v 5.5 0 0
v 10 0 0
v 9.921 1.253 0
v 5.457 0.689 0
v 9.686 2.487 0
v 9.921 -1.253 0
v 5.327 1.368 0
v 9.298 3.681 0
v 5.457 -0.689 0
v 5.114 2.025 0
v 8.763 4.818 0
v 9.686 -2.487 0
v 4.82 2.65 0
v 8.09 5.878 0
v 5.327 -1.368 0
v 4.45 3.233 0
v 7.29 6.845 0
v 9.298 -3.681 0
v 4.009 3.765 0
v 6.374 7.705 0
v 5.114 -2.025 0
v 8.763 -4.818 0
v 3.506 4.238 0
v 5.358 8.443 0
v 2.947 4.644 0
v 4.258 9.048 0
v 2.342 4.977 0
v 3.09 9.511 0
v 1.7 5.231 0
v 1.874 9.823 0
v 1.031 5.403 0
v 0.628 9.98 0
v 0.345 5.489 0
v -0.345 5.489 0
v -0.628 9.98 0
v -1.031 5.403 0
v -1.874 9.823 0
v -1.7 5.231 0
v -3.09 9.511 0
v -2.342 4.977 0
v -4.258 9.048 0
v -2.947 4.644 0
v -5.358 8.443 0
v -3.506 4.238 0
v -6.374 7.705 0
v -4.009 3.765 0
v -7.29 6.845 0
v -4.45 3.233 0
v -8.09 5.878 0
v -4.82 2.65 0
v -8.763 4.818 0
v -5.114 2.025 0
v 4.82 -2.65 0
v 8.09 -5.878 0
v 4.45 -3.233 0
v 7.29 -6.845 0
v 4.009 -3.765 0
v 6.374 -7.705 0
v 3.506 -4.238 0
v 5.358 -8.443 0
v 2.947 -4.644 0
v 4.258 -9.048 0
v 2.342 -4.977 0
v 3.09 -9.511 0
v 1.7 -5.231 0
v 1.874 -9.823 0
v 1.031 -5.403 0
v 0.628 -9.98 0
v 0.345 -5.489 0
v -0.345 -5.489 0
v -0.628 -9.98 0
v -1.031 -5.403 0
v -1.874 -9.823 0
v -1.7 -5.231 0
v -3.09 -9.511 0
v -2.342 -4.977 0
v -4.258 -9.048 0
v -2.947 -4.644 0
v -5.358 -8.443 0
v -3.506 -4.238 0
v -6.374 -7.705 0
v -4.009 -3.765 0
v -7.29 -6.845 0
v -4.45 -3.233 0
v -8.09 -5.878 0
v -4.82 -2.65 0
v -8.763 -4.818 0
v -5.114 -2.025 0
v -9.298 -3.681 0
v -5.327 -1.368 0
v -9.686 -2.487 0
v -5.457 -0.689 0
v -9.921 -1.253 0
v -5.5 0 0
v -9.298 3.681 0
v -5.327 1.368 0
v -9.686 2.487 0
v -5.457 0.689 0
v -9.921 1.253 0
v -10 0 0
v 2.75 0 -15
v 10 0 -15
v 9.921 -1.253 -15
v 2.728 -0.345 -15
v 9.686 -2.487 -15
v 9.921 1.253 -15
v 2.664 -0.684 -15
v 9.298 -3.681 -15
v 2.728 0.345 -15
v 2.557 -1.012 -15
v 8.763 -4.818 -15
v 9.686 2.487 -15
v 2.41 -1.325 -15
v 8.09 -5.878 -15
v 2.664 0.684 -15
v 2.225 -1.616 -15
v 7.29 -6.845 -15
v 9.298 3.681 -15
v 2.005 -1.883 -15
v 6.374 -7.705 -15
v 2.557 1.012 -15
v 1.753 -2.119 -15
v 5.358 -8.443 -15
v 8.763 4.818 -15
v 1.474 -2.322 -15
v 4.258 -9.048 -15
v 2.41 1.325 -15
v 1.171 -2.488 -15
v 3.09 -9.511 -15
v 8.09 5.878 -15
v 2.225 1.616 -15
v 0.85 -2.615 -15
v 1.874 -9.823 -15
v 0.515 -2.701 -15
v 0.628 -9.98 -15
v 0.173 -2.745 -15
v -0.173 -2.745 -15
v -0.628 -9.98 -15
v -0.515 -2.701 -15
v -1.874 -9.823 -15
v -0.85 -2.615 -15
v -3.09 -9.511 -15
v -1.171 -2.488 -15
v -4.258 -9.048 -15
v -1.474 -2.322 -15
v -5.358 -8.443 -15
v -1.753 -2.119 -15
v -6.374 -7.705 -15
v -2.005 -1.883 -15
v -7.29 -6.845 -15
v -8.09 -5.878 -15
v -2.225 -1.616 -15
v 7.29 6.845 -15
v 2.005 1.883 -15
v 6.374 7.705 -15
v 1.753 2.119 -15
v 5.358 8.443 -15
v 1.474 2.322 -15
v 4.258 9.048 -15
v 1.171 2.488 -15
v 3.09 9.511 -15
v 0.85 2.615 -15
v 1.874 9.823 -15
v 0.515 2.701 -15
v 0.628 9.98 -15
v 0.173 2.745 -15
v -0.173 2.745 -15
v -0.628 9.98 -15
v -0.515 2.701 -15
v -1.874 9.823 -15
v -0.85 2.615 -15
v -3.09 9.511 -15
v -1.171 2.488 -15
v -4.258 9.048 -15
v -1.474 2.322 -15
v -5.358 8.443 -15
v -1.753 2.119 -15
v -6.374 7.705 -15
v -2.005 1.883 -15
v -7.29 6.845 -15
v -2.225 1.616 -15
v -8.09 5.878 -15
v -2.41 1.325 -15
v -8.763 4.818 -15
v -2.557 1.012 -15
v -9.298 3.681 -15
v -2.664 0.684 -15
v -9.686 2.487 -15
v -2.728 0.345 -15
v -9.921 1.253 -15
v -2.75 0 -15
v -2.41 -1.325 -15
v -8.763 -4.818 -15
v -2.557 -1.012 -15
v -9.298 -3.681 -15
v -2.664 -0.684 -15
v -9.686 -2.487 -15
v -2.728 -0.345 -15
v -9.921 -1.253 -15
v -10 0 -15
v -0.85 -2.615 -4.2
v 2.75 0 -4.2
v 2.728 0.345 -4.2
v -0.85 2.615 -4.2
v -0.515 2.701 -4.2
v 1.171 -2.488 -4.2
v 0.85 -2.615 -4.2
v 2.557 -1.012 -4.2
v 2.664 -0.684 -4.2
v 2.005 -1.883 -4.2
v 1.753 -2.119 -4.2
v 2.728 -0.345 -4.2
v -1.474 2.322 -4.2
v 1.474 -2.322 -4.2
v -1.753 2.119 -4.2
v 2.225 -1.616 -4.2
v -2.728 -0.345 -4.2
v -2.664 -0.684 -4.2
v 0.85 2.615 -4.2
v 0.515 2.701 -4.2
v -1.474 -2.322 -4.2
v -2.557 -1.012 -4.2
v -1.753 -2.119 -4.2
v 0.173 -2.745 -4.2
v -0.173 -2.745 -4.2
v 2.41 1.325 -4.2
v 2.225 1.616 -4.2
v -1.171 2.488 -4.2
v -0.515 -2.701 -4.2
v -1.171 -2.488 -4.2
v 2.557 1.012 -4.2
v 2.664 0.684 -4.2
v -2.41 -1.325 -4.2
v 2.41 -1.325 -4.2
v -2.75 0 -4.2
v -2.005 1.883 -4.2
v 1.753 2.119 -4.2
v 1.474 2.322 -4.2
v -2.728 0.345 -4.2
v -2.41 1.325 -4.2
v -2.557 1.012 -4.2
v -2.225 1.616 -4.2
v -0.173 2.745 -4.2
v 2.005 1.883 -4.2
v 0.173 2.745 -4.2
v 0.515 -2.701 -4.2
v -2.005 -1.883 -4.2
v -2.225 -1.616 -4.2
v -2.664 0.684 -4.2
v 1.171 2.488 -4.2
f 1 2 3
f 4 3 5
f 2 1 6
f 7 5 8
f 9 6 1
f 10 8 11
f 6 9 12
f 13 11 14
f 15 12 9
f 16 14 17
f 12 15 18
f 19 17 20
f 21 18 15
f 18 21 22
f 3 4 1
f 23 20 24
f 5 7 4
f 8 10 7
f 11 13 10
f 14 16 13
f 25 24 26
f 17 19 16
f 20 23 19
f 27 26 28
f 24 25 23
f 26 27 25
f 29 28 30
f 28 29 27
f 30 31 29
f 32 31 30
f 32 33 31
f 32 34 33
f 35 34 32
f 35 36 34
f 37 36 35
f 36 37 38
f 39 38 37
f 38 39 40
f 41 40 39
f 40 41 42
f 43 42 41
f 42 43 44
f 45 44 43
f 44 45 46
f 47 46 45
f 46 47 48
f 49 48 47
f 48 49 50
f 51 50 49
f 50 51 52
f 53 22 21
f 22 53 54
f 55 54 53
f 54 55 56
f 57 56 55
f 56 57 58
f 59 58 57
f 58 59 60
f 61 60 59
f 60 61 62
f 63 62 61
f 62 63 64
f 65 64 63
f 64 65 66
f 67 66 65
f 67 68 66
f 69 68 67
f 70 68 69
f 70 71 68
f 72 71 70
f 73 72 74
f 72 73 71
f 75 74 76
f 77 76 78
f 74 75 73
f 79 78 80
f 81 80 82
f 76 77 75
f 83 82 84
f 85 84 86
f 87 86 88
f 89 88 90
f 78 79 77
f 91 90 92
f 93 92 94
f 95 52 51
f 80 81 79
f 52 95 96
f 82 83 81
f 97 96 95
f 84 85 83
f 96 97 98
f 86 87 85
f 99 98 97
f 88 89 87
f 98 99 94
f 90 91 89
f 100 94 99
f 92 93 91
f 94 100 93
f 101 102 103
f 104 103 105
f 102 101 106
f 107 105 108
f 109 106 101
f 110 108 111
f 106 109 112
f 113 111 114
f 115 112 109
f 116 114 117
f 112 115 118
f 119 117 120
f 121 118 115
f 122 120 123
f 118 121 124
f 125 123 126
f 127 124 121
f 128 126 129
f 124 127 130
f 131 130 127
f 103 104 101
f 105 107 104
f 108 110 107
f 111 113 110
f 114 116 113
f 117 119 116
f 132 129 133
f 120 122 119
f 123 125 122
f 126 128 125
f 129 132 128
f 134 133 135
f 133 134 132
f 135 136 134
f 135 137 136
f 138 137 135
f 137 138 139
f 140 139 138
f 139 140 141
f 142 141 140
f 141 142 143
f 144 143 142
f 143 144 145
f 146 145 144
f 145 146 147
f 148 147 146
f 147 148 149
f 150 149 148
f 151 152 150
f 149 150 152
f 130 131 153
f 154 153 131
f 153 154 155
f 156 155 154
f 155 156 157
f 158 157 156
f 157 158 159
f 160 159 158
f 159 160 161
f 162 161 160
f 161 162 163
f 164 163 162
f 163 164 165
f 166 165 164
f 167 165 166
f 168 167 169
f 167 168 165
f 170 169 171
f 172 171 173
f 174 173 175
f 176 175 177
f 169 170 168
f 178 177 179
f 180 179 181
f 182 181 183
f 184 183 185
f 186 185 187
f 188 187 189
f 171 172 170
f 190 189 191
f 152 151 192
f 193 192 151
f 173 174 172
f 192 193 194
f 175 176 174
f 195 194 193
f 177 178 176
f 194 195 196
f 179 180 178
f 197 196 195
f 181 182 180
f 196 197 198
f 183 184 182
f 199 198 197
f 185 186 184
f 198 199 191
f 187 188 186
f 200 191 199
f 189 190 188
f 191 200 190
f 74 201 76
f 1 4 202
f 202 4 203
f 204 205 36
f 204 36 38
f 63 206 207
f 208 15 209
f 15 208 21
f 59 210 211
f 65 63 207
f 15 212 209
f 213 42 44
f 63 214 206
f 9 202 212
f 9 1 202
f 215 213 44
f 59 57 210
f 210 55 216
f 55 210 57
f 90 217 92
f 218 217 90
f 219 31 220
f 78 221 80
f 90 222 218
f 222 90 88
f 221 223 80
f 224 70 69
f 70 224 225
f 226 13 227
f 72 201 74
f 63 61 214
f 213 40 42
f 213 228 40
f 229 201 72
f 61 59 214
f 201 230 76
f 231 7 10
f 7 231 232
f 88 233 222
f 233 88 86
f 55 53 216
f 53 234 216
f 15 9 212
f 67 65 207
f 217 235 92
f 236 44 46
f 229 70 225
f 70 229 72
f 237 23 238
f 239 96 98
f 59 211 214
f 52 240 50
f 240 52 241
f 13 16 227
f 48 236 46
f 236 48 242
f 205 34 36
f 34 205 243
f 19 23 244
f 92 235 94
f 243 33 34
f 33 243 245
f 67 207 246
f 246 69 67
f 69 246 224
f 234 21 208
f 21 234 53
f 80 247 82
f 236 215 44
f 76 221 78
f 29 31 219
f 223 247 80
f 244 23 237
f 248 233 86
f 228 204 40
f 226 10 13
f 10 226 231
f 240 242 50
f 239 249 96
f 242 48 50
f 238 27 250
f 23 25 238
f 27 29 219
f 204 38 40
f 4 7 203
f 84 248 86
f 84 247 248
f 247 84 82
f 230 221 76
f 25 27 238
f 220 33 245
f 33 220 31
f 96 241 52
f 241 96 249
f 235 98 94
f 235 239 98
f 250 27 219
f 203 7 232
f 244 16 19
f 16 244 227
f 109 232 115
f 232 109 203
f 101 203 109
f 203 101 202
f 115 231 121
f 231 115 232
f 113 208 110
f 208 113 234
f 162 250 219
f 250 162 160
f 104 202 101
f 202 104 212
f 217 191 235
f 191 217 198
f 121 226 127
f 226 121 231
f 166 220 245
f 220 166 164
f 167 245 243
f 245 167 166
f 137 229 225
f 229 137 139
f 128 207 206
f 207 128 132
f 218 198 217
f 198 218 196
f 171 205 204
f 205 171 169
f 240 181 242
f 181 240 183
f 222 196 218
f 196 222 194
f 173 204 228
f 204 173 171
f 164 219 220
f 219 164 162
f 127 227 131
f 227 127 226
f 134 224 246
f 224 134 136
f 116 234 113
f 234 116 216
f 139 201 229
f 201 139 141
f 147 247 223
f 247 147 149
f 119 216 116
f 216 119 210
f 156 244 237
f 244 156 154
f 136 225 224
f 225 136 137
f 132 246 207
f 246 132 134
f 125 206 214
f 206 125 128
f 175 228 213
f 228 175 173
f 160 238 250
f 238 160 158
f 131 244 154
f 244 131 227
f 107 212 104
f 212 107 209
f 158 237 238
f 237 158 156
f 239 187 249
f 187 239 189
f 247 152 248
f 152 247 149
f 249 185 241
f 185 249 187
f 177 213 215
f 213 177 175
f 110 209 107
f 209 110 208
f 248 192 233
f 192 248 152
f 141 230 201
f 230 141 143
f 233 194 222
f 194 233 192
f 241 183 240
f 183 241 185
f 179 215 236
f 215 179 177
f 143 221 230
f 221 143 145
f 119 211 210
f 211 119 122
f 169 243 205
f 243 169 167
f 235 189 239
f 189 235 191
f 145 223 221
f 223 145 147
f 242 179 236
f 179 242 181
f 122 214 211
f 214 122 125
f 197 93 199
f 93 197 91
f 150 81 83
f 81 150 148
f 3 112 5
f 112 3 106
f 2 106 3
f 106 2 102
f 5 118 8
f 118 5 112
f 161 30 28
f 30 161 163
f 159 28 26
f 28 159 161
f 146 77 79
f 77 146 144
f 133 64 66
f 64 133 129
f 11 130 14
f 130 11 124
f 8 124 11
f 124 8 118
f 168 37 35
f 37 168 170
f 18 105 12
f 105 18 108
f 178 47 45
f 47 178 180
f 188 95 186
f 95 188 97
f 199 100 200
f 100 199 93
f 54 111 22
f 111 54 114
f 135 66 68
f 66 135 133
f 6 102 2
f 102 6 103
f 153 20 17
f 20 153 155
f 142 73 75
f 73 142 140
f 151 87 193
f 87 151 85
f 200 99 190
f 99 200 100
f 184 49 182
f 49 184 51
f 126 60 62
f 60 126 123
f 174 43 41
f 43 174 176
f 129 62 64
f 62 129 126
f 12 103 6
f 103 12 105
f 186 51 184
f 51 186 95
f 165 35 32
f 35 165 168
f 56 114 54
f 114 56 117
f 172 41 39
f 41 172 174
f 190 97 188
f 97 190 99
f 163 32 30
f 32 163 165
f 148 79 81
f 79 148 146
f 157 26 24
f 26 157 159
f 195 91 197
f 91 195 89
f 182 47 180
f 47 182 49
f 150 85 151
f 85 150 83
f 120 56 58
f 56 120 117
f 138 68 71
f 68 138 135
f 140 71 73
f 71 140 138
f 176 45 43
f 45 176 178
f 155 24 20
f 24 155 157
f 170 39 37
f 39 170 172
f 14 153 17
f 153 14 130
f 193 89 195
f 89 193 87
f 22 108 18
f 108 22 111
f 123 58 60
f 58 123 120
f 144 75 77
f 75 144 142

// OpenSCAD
$fn = 50;


difference() {
	union() {
		translate(v = [0, 0, -15.0000000000]) {
			cylinder(h = 15, r = 10.0000000000);
		}
		cylinder(h = 0, r = 20.0000000000);
	}
	union() {
		translate(v = [0, 0, 0]) {
			rotate(a = [0, 0, 0]) {
				difference() {
					union() {
						#translate(v = [0, 0, -15.0000000000]) {
							cylinder(h = 15, r = 2.2500000000);
						}
						#translate(v = [0, 0, -4.2000000000]) {
							cylinder(h = 4.2000000000, r = 10.0000000000, r1 = 2.7500000000, r2 = 5.5000000000);
						}
						#translate(v = [0, 0, -15.0000000000]) {
							cylinder(h = 15, r = 2.7500000000);
						}
						#translate(v = [0, 0, -15.0000000000]) {
							cylinder(h = 15, r = 2.2500000000);
						}
					}
					union();
				}
			}
		}
	}
}
